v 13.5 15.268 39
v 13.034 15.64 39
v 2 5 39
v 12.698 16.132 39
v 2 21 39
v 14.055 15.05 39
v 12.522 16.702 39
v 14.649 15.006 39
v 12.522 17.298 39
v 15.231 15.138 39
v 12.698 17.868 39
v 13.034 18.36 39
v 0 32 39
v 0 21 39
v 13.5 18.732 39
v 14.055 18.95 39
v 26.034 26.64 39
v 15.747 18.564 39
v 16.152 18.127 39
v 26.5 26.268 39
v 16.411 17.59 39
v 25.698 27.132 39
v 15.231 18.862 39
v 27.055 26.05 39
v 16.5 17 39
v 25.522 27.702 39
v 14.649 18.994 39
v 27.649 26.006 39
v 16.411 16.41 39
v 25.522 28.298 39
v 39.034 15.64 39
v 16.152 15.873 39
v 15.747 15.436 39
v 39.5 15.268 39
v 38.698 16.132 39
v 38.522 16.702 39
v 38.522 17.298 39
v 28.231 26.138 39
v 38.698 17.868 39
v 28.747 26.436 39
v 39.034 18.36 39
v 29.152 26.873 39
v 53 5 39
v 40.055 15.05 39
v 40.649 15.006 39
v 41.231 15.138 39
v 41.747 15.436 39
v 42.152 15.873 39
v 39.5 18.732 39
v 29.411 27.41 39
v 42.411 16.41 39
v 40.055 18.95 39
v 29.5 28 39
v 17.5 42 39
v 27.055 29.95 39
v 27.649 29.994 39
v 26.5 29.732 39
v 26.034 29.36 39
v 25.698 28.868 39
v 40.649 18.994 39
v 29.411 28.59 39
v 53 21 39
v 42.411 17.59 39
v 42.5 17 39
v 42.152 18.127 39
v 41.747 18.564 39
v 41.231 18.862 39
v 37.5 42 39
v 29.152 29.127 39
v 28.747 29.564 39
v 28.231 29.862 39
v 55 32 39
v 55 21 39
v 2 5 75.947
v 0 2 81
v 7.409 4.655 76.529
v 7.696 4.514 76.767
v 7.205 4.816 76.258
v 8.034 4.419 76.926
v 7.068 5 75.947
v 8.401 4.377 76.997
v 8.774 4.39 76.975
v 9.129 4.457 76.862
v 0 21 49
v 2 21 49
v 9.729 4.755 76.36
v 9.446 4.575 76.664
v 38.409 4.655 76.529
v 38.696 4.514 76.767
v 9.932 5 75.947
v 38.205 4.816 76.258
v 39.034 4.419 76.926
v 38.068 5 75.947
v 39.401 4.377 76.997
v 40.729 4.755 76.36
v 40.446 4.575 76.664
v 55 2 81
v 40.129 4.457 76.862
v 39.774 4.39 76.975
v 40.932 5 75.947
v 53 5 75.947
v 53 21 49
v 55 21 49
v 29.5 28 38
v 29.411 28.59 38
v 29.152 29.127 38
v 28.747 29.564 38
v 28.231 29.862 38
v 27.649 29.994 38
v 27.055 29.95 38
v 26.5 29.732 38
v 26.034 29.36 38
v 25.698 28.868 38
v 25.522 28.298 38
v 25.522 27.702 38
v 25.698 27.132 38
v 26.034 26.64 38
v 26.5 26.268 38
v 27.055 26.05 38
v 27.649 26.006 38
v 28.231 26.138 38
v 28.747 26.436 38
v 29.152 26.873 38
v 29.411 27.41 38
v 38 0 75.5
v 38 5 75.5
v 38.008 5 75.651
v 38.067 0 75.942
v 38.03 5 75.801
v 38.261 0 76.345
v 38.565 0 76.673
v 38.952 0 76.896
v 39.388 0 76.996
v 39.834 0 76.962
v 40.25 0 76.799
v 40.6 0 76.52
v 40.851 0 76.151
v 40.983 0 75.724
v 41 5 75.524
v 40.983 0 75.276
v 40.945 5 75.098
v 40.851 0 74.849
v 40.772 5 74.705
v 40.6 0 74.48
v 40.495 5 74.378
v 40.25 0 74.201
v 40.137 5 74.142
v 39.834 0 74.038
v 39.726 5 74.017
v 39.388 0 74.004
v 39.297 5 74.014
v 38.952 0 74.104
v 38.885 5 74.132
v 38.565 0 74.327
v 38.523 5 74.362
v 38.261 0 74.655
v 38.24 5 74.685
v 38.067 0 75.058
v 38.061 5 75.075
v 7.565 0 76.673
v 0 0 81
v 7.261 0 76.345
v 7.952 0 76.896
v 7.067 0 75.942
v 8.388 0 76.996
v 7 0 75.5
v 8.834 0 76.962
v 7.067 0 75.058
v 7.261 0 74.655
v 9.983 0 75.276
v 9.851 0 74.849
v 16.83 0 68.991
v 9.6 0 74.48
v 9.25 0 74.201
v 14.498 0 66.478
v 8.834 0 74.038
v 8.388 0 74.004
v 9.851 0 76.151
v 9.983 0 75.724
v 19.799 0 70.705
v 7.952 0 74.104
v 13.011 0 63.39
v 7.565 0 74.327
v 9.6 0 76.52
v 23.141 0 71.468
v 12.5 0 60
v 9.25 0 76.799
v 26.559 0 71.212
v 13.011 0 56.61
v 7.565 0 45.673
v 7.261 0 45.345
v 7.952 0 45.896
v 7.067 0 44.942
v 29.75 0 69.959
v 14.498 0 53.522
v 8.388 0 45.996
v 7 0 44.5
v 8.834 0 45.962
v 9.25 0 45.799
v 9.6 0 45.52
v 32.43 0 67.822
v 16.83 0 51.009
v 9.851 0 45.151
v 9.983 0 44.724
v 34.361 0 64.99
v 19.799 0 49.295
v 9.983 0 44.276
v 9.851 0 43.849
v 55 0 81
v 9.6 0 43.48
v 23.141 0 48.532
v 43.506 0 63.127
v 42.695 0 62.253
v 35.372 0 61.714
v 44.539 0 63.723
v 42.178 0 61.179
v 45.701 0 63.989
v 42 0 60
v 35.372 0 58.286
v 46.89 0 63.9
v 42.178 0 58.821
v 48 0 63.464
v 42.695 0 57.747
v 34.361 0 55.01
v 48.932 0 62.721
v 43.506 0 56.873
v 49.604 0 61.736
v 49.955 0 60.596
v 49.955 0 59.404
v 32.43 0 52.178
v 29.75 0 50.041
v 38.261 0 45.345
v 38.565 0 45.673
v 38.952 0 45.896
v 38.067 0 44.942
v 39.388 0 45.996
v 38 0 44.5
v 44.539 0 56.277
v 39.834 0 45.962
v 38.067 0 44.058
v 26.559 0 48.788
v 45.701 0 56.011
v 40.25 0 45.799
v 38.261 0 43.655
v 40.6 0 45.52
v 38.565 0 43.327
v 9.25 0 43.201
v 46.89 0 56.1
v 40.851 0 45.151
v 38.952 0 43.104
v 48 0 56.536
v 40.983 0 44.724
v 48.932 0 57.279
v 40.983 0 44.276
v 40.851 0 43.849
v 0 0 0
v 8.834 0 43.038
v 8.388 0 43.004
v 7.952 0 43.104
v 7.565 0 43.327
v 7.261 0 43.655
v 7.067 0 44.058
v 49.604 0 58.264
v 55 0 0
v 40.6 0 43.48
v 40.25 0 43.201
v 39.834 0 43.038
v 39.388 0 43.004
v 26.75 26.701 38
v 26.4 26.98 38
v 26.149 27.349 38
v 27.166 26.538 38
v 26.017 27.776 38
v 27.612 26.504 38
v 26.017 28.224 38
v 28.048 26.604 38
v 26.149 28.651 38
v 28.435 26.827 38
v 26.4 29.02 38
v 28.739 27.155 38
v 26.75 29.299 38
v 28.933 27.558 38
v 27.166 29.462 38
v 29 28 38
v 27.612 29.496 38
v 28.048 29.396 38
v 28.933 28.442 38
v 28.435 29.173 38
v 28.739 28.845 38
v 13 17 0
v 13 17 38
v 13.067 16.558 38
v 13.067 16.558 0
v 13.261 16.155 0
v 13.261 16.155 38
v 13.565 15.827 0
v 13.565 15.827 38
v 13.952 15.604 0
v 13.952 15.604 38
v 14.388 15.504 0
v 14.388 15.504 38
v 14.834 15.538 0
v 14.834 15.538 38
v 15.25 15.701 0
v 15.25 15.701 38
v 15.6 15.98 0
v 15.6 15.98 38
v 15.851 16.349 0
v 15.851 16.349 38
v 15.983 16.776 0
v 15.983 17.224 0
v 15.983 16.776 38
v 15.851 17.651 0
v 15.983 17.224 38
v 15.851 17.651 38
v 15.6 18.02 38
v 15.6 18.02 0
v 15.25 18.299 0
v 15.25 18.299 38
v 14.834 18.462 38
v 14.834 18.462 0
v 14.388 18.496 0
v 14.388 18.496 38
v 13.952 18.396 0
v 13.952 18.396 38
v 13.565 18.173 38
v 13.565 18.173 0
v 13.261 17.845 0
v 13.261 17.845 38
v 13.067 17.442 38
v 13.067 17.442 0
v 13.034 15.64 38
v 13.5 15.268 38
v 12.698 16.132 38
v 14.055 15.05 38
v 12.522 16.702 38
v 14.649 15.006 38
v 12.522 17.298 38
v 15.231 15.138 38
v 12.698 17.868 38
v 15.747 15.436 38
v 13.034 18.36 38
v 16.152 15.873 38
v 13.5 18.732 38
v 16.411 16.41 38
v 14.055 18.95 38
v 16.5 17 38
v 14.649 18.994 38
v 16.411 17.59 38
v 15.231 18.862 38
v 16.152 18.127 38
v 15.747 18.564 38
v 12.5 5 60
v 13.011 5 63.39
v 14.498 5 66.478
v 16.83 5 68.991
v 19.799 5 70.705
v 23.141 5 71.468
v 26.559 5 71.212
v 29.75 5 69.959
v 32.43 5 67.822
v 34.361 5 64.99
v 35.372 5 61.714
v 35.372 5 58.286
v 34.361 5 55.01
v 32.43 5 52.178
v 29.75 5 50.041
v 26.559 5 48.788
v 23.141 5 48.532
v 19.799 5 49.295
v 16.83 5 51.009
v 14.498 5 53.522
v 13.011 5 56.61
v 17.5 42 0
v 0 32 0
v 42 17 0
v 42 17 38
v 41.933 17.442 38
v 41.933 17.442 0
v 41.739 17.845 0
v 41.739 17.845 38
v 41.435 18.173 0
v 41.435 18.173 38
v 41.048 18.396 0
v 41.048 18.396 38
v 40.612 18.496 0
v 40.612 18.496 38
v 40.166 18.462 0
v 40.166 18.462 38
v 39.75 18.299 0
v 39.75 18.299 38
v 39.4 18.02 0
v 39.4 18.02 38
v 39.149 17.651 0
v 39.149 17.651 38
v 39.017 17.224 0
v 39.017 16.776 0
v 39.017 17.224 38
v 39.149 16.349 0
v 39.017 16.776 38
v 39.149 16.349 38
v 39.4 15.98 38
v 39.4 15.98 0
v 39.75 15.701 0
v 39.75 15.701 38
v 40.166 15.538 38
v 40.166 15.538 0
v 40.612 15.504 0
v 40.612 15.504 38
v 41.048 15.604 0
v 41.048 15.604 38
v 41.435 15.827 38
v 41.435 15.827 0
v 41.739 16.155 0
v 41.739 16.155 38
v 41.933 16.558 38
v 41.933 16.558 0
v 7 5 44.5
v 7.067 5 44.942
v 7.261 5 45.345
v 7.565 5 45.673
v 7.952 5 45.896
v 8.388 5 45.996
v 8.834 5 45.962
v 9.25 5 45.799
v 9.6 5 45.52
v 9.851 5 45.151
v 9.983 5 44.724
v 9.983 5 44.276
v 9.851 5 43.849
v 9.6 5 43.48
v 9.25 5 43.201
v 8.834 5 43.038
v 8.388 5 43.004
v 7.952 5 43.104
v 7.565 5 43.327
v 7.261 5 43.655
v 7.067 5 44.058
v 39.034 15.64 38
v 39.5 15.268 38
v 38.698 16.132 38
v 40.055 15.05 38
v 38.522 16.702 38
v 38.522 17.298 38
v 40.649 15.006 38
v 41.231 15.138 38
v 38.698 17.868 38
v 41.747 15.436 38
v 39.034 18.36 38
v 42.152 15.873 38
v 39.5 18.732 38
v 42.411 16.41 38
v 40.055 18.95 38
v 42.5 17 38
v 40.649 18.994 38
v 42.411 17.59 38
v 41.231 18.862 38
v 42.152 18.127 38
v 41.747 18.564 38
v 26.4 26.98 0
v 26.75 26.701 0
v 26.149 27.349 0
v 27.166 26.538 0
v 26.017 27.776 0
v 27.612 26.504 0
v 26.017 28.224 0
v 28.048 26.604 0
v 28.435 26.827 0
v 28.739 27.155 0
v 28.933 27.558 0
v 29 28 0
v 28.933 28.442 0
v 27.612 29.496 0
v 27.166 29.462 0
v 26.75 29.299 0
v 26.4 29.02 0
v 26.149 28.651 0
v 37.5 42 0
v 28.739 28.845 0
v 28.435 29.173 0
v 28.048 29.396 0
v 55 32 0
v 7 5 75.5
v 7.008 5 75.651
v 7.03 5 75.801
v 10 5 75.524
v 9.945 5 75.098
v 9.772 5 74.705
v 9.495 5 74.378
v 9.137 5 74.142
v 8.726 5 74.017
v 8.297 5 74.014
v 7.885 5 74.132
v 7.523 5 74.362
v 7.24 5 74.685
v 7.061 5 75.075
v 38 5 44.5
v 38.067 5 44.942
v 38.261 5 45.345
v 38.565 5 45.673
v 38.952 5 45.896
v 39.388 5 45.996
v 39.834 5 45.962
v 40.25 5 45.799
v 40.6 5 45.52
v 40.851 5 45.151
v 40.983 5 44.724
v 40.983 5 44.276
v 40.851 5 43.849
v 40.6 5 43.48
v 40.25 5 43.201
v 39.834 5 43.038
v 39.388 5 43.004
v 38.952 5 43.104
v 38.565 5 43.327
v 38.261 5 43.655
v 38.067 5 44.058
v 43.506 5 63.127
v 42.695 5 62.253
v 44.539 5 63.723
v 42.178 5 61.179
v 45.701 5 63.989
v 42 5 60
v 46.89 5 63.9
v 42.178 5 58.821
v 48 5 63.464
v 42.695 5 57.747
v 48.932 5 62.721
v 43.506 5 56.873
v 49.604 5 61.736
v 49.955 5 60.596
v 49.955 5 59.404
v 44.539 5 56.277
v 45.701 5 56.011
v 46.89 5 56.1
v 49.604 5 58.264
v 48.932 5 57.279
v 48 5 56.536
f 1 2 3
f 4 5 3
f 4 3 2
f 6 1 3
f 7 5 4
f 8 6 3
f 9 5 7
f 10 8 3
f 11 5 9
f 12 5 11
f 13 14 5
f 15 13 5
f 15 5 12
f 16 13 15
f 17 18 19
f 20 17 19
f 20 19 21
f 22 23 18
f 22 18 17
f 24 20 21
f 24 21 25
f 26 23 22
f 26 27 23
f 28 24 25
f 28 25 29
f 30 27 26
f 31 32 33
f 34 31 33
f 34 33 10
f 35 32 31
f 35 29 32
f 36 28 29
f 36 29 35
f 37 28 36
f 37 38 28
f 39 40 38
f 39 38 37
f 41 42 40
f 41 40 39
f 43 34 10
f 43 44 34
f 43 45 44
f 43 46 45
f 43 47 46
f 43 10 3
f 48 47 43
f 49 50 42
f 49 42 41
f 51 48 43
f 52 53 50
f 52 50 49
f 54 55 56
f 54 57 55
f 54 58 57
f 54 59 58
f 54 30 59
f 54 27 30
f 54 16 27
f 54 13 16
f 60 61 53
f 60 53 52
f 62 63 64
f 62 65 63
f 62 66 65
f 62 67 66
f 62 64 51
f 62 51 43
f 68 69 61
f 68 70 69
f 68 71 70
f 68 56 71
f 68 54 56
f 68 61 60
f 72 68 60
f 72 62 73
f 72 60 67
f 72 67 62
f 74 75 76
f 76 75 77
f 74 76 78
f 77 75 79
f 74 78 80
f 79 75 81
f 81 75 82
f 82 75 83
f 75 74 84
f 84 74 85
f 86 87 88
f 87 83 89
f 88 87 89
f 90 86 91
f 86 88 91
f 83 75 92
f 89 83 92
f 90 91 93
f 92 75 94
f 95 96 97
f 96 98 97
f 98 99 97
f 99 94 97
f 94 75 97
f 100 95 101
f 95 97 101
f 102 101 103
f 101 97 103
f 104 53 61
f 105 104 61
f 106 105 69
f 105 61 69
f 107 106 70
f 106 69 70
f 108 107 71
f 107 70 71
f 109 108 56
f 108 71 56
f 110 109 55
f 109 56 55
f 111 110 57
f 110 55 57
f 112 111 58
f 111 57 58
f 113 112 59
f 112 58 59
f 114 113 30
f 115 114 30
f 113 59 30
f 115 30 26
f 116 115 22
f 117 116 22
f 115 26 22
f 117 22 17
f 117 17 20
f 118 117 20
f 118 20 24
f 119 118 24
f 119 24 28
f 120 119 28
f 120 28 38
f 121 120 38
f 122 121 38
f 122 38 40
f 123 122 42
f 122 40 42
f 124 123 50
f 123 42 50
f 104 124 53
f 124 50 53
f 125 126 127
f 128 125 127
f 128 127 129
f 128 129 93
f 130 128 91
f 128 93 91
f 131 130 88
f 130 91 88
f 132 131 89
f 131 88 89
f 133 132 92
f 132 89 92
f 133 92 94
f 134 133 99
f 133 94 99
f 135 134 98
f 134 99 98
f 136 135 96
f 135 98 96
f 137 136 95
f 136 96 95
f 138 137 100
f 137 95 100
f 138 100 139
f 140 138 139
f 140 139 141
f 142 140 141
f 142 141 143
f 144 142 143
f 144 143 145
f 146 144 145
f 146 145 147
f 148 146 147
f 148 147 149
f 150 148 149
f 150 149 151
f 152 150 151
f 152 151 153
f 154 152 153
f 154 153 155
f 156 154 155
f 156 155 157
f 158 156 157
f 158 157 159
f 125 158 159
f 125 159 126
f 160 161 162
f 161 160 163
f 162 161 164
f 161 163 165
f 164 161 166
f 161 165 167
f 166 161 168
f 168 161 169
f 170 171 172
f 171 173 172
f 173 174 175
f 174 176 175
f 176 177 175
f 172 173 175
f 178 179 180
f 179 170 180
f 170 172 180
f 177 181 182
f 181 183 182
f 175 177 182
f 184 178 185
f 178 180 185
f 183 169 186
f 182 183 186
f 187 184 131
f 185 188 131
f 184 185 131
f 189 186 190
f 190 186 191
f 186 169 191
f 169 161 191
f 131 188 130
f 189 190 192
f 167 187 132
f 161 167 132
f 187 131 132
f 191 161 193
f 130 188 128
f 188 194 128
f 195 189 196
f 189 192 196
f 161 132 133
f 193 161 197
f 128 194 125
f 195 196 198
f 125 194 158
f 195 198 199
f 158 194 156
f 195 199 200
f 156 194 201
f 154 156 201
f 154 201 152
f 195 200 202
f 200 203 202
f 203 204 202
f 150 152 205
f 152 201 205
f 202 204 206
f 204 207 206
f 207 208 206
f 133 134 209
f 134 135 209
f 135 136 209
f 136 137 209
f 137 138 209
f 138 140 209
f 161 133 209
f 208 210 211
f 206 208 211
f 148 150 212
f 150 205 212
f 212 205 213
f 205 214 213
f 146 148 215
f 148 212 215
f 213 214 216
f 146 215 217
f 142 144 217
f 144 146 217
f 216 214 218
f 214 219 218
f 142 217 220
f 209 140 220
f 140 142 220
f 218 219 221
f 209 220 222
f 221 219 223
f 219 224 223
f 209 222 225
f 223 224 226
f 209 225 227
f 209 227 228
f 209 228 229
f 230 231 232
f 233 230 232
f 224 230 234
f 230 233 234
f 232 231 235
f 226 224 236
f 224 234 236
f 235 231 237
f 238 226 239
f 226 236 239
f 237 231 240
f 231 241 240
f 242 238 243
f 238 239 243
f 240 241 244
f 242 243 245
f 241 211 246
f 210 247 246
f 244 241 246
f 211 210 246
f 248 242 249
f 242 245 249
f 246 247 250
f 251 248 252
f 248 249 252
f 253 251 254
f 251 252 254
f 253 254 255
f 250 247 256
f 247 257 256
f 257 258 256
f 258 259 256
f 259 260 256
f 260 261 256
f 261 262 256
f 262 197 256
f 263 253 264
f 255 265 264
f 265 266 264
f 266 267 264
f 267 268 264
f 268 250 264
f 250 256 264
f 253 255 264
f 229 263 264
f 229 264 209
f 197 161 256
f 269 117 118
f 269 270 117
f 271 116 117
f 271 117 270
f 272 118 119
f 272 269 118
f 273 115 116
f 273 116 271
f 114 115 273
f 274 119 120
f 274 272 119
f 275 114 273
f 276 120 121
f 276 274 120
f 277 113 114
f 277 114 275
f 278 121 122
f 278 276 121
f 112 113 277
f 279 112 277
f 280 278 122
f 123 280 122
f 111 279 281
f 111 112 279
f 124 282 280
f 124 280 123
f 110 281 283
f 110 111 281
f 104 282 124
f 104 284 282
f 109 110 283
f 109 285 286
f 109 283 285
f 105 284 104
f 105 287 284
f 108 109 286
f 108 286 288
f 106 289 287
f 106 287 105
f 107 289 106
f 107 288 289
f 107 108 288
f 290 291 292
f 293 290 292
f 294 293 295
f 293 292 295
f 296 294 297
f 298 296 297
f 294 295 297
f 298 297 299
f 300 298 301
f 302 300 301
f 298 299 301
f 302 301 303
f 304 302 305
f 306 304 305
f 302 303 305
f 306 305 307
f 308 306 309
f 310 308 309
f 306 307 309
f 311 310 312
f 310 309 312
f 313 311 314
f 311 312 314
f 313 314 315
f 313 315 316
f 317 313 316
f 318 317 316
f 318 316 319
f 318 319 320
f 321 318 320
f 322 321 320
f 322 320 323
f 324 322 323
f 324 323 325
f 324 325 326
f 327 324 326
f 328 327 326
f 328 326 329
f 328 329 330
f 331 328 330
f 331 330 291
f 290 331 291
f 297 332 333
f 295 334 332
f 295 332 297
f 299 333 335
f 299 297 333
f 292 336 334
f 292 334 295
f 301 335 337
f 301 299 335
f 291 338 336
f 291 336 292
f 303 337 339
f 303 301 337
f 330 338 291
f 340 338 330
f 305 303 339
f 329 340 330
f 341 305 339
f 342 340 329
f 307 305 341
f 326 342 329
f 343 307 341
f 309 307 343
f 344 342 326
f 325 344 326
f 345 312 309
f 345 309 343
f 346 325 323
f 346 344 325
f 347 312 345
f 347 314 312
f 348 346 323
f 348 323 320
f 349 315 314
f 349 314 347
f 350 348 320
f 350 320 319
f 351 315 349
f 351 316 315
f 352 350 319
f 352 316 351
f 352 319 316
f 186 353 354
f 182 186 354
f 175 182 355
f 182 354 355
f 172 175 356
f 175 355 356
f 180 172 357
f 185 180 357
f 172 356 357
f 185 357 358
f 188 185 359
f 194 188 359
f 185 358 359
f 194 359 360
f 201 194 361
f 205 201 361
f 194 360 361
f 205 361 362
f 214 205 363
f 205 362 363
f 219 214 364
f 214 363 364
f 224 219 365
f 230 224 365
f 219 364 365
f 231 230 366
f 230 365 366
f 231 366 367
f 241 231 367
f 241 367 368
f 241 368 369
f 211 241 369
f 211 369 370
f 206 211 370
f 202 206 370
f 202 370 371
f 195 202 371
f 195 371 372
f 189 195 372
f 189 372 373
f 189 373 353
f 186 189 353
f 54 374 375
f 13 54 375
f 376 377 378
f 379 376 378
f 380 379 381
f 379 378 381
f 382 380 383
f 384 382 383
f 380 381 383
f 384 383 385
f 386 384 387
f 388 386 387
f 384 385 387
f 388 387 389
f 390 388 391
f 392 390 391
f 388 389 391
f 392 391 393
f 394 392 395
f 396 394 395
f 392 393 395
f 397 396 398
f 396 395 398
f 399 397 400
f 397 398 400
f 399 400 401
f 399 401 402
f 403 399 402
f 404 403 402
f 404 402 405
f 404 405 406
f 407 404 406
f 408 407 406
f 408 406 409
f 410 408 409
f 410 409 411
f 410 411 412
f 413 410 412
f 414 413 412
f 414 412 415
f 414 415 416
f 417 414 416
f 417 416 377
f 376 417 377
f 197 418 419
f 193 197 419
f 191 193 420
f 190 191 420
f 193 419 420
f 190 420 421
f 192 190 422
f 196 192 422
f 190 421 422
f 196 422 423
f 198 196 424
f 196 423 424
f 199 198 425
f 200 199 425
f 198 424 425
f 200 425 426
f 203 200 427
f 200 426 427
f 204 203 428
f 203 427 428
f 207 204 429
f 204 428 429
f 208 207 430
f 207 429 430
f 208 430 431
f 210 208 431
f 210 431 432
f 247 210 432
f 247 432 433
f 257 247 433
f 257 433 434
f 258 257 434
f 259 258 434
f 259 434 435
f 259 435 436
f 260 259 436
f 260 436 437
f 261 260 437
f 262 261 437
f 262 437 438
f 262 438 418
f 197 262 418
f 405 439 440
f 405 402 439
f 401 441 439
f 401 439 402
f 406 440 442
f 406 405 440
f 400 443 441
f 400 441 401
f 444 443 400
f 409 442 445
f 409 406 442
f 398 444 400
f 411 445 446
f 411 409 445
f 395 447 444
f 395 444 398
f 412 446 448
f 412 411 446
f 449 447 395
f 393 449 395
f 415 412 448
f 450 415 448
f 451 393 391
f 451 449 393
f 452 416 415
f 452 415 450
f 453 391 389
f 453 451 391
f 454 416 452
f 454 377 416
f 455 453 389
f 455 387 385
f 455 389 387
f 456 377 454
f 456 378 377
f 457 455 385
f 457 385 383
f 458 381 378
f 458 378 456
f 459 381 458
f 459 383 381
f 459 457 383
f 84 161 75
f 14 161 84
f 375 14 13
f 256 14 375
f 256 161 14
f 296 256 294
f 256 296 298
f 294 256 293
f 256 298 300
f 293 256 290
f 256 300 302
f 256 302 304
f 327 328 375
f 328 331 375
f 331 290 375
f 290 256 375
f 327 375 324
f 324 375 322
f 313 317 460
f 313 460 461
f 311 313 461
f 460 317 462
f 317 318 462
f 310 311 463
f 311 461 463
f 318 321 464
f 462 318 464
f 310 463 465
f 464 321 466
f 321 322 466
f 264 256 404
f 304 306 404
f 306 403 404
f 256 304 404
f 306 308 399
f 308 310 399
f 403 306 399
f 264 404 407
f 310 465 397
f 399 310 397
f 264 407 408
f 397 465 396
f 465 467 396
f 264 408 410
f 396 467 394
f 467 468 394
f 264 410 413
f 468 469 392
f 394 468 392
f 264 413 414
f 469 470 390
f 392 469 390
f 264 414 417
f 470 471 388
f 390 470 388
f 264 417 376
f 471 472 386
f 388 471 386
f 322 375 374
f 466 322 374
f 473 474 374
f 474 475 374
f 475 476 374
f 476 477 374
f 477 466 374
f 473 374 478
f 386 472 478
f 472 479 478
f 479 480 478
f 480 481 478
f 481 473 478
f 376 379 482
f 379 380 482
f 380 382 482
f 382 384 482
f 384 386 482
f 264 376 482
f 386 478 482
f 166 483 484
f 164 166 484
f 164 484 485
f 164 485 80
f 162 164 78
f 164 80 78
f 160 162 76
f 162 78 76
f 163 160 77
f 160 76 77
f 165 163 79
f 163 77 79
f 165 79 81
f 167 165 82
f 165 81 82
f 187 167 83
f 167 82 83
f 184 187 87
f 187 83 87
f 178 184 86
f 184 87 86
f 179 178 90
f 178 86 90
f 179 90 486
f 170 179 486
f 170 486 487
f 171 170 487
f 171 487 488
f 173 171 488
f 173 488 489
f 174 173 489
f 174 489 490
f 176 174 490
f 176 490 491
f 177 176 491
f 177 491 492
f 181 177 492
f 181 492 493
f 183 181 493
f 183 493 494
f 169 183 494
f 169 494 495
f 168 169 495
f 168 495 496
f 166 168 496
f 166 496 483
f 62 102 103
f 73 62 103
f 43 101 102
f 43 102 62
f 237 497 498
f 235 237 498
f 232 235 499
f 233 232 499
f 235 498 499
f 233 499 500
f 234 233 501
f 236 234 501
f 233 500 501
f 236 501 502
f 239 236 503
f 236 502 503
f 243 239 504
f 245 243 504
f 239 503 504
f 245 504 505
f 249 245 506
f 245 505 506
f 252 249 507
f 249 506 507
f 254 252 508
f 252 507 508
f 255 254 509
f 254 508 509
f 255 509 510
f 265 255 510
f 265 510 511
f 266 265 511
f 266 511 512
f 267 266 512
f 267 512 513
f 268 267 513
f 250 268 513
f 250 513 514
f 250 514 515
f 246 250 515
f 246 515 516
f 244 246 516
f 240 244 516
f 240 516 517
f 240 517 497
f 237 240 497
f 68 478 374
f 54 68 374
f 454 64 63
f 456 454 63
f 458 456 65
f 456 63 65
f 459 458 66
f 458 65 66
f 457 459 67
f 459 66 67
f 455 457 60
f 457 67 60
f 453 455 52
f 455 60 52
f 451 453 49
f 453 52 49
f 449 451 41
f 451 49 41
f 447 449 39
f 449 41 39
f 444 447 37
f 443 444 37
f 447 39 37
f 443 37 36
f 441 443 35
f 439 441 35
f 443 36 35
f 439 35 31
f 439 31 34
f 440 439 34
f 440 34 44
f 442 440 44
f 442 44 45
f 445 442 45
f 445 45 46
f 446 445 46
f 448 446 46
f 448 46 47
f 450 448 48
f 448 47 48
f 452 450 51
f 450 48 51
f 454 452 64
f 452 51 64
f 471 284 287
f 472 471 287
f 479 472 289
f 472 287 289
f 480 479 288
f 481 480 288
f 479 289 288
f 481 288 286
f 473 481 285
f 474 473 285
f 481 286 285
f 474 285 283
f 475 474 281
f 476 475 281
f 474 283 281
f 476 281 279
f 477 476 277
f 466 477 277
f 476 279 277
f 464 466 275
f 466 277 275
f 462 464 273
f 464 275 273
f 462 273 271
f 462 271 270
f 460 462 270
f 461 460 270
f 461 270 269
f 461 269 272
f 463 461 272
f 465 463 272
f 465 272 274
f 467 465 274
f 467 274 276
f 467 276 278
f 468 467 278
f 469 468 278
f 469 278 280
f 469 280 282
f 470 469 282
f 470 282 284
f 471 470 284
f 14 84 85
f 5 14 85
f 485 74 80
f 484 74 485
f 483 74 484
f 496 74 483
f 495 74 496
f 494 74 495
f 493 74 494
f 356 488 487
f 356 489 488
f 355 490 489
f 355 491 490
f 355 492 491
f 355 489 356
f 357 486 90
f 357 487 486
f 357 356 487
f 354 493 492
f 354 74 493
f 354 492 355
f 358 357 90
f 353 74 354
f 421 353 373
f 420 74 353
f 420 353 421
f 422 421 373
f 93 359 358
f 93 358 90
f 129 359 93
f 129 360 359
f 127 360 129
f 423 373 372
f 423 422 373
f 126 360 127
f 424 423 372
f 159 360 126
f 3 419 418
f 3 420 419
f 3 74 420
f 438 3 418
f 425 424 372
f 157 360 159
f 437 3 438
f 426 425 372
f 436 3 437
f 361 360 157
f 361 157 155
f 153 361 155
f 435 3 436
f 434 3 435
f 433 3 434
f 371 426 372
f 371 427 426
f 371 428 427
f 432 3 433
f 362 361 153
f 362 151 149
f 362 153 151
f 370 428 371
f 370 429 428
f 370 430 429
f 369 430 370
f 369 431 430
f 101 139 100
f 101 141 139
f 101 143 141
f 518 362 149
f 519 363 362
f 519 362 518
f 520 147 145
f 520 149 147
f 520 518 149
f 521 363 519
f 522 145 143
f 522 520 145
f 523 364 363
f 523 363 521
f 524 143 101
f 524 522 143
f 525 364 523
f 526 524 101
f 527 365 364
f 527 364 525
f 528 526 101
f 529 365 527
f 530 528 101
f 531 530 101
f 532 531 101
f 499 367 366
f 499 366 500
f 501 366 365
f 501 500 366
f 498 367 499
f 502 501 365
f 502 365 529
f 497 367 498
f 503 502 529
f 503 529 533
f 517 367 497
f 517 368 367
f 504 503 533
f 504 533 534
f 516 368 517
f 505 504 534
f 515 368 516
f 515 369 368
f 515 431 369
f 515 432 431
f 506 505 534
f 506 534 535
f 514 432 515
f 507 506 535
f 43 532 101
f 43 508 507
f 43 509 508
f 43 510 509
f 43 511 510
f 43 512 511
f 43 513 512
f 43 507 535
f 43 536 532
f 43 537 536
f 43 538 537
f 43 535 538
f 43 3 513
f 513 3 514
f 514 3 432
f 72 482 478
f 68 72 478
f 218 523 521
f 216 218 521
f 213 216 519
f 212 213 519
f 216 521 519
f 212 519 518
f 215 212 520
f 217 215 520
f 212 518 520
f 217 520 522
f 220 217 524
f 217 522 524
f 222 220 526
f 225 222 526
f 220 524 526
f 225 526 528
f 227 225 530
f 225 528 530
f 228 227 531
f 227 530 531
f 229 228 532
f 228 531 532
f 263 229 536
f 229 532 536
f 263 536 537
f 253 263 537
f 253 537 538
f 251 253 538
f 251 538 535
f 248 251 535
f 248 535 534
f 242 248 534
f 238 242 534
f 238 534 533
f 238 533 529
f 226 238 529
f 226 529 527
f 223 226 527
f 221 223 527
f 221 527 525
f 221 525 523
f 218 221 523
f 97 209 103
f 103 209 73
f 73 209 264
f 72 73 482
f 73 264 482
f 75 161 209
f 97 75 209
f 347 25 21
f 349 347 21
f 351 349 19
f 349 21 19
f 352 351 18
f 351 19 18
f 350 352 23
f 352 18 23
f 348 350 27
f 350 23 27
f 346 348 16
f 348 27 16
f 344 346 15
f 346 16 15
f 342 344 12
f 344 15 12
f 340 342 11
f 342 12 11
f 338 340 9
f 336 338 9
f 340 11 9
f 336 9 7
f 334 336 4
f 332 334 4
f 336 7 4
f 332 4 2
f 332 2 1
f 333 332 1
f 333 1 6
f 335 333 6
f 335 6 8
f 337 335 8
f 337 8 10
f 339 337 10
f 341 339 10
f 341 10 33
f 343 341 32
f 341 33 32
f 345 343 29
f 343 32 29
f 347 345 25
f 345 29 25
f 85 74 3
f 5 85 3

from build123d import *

# Parameters (mm, degrees)
BOSS_EXTRUDE1_DEPTH = 39
SKETCH2_W           = 55
SKETCH2_H           = 5
BOSS_EXTRUDE2_DEPTH = 42
SKETCH3_R           = 11.5
SKETCH3_R_2         = 1.5
SKETCH3_R_3         = 4
CUT_EXTRUDE1_DEPTH  = 105.66613588
SKETCH4_R           = 1.5
CUT_EXTRUDE2_DEPTH  = 81.950602221
SKETCH5_R           = 2
CUT_EXTRUDE3_DEPTH  = 1
SKETCH6_W           = 2
SKETCH6_H           = 42
BOSS_EXTRUDE3_DEPTH = 16
CUT_EXTRUDE4_DEPTH  = 100


with BuildPart() as part:
    # Sketch1 → Boss-Extrude1 (new body)
    with BuildSketch(Plane.XY):
        Polygon((0, 0), (55, 0), (55, 32), (37.5, 42), (17.5, 42), (0, 32), align=None)
    extrude(amount=BOSS_EXTRUDE1_DEPTH)

    # Sketch2 → Boss-Extrude2 (add)
    with BuildSketch(Plane.XY.offset(39)):
        with Locations((27.5, 2.5)):
            Rectangle(SKETCH2_W, SKETCH2_H)
    extrude(amount=BOSS_EXTRUDE2_DEPTH)

    # Sketch3 → Cut-Extrude1 (cut, through all)
    with BuildSketch(Plane(origin=(0, 5, 0), x_dir=(1, 0, 0), z_dir=(0, 1, 0))):
        with Locations(Location((24, -60, 0), (0, 0, 180))):
            Circle(SKETCH3_R)
        with Locations(Location((8.5, -44.5, 0), (0, 0, 180))):
            Circle(SKETCH3_R_2)
        with Locations(Location((39.5, -44.5, 0), (0, 0, 180))):
            Circle(SKETCH3_R_2)
        with Locations(Location((39.5, -75.5, 0), (0, 0, 180))):
            Circle(SKETCH3_R_2)
        with Locations(Location((8.5, -75.5, 0), (0, 0, 180))):
            Circle(SKETCH3_R_2)
        with Locations(Location((46, -60, 0), (0, 0, 180))):
            Circle(SKETCH3_R_3)
    extrude(amount=-CUT_EXTRUDE1_DEPTH, mode=Mode.SUBTRACT)

    # Sketch4 → Cut-Extrude2 (cut, through all)
    with BuildSketch(Plane.XY.offset(39)):
        with Locations((27.5, 28)):
            Circle(SKETCH4_R)
        with Locations((40.5, 17)):
            Circle(SKETCH4_R)
        with Locations(Location((14.5, 17, 0), (0, 0, 180))):
            Circle(SKETCH4_R)
    extrude(amount=-CUT_EXTRUDE2_DEPTH, mode=Mode.SUBTRACT)

    # Sketch5 → Cut-Extrude3 (cut)
    with BuildSketch(Plane.XY.offset(39)):
        with Locations((27.5, 28)):
            Circle(SKETCH5_R)
        with Locations((40.5, 17)):
            Circle(SKETCH5_R)
        with Locations((14.5, 17)):
            Circle(SKETCH5_R)
    extrude(amount=-CUT_EXTRUDE3_DEPTH, mode=Mode.SUBTRACT)

    # Sketch6 → Boss-Extrude3 (add)
    with BuildSketch(Plane(origin=(0, 5, 0), x_dir=(1, 0, 0), z_dir=(0, 1, 0))):
        with Locations((1, -60)):
            Rectangle(SKETCH6_W, SKETCH6_H)
        with Locations((54, -60)):
            Rectangle(SKETCH6_W, SKETCH6_H)
    extrude(amount=BOSS_EXTRUDE3_DEPTH)

    # Sketch7 → Cut-Extrude4 (cut)
    with BuildSketch(Plane(origin=(55, 0, 0), x_dir=(0, 0, -1), z_dir=(1, 0, 0))):
        Polygon((-49, 21), (-81, 21), (-81, 2), align=None)
    extrude(amount=-CUT_EXTRUDE4_DEPTH, mode=Mode.SUBTRACT)


solid = part.part
